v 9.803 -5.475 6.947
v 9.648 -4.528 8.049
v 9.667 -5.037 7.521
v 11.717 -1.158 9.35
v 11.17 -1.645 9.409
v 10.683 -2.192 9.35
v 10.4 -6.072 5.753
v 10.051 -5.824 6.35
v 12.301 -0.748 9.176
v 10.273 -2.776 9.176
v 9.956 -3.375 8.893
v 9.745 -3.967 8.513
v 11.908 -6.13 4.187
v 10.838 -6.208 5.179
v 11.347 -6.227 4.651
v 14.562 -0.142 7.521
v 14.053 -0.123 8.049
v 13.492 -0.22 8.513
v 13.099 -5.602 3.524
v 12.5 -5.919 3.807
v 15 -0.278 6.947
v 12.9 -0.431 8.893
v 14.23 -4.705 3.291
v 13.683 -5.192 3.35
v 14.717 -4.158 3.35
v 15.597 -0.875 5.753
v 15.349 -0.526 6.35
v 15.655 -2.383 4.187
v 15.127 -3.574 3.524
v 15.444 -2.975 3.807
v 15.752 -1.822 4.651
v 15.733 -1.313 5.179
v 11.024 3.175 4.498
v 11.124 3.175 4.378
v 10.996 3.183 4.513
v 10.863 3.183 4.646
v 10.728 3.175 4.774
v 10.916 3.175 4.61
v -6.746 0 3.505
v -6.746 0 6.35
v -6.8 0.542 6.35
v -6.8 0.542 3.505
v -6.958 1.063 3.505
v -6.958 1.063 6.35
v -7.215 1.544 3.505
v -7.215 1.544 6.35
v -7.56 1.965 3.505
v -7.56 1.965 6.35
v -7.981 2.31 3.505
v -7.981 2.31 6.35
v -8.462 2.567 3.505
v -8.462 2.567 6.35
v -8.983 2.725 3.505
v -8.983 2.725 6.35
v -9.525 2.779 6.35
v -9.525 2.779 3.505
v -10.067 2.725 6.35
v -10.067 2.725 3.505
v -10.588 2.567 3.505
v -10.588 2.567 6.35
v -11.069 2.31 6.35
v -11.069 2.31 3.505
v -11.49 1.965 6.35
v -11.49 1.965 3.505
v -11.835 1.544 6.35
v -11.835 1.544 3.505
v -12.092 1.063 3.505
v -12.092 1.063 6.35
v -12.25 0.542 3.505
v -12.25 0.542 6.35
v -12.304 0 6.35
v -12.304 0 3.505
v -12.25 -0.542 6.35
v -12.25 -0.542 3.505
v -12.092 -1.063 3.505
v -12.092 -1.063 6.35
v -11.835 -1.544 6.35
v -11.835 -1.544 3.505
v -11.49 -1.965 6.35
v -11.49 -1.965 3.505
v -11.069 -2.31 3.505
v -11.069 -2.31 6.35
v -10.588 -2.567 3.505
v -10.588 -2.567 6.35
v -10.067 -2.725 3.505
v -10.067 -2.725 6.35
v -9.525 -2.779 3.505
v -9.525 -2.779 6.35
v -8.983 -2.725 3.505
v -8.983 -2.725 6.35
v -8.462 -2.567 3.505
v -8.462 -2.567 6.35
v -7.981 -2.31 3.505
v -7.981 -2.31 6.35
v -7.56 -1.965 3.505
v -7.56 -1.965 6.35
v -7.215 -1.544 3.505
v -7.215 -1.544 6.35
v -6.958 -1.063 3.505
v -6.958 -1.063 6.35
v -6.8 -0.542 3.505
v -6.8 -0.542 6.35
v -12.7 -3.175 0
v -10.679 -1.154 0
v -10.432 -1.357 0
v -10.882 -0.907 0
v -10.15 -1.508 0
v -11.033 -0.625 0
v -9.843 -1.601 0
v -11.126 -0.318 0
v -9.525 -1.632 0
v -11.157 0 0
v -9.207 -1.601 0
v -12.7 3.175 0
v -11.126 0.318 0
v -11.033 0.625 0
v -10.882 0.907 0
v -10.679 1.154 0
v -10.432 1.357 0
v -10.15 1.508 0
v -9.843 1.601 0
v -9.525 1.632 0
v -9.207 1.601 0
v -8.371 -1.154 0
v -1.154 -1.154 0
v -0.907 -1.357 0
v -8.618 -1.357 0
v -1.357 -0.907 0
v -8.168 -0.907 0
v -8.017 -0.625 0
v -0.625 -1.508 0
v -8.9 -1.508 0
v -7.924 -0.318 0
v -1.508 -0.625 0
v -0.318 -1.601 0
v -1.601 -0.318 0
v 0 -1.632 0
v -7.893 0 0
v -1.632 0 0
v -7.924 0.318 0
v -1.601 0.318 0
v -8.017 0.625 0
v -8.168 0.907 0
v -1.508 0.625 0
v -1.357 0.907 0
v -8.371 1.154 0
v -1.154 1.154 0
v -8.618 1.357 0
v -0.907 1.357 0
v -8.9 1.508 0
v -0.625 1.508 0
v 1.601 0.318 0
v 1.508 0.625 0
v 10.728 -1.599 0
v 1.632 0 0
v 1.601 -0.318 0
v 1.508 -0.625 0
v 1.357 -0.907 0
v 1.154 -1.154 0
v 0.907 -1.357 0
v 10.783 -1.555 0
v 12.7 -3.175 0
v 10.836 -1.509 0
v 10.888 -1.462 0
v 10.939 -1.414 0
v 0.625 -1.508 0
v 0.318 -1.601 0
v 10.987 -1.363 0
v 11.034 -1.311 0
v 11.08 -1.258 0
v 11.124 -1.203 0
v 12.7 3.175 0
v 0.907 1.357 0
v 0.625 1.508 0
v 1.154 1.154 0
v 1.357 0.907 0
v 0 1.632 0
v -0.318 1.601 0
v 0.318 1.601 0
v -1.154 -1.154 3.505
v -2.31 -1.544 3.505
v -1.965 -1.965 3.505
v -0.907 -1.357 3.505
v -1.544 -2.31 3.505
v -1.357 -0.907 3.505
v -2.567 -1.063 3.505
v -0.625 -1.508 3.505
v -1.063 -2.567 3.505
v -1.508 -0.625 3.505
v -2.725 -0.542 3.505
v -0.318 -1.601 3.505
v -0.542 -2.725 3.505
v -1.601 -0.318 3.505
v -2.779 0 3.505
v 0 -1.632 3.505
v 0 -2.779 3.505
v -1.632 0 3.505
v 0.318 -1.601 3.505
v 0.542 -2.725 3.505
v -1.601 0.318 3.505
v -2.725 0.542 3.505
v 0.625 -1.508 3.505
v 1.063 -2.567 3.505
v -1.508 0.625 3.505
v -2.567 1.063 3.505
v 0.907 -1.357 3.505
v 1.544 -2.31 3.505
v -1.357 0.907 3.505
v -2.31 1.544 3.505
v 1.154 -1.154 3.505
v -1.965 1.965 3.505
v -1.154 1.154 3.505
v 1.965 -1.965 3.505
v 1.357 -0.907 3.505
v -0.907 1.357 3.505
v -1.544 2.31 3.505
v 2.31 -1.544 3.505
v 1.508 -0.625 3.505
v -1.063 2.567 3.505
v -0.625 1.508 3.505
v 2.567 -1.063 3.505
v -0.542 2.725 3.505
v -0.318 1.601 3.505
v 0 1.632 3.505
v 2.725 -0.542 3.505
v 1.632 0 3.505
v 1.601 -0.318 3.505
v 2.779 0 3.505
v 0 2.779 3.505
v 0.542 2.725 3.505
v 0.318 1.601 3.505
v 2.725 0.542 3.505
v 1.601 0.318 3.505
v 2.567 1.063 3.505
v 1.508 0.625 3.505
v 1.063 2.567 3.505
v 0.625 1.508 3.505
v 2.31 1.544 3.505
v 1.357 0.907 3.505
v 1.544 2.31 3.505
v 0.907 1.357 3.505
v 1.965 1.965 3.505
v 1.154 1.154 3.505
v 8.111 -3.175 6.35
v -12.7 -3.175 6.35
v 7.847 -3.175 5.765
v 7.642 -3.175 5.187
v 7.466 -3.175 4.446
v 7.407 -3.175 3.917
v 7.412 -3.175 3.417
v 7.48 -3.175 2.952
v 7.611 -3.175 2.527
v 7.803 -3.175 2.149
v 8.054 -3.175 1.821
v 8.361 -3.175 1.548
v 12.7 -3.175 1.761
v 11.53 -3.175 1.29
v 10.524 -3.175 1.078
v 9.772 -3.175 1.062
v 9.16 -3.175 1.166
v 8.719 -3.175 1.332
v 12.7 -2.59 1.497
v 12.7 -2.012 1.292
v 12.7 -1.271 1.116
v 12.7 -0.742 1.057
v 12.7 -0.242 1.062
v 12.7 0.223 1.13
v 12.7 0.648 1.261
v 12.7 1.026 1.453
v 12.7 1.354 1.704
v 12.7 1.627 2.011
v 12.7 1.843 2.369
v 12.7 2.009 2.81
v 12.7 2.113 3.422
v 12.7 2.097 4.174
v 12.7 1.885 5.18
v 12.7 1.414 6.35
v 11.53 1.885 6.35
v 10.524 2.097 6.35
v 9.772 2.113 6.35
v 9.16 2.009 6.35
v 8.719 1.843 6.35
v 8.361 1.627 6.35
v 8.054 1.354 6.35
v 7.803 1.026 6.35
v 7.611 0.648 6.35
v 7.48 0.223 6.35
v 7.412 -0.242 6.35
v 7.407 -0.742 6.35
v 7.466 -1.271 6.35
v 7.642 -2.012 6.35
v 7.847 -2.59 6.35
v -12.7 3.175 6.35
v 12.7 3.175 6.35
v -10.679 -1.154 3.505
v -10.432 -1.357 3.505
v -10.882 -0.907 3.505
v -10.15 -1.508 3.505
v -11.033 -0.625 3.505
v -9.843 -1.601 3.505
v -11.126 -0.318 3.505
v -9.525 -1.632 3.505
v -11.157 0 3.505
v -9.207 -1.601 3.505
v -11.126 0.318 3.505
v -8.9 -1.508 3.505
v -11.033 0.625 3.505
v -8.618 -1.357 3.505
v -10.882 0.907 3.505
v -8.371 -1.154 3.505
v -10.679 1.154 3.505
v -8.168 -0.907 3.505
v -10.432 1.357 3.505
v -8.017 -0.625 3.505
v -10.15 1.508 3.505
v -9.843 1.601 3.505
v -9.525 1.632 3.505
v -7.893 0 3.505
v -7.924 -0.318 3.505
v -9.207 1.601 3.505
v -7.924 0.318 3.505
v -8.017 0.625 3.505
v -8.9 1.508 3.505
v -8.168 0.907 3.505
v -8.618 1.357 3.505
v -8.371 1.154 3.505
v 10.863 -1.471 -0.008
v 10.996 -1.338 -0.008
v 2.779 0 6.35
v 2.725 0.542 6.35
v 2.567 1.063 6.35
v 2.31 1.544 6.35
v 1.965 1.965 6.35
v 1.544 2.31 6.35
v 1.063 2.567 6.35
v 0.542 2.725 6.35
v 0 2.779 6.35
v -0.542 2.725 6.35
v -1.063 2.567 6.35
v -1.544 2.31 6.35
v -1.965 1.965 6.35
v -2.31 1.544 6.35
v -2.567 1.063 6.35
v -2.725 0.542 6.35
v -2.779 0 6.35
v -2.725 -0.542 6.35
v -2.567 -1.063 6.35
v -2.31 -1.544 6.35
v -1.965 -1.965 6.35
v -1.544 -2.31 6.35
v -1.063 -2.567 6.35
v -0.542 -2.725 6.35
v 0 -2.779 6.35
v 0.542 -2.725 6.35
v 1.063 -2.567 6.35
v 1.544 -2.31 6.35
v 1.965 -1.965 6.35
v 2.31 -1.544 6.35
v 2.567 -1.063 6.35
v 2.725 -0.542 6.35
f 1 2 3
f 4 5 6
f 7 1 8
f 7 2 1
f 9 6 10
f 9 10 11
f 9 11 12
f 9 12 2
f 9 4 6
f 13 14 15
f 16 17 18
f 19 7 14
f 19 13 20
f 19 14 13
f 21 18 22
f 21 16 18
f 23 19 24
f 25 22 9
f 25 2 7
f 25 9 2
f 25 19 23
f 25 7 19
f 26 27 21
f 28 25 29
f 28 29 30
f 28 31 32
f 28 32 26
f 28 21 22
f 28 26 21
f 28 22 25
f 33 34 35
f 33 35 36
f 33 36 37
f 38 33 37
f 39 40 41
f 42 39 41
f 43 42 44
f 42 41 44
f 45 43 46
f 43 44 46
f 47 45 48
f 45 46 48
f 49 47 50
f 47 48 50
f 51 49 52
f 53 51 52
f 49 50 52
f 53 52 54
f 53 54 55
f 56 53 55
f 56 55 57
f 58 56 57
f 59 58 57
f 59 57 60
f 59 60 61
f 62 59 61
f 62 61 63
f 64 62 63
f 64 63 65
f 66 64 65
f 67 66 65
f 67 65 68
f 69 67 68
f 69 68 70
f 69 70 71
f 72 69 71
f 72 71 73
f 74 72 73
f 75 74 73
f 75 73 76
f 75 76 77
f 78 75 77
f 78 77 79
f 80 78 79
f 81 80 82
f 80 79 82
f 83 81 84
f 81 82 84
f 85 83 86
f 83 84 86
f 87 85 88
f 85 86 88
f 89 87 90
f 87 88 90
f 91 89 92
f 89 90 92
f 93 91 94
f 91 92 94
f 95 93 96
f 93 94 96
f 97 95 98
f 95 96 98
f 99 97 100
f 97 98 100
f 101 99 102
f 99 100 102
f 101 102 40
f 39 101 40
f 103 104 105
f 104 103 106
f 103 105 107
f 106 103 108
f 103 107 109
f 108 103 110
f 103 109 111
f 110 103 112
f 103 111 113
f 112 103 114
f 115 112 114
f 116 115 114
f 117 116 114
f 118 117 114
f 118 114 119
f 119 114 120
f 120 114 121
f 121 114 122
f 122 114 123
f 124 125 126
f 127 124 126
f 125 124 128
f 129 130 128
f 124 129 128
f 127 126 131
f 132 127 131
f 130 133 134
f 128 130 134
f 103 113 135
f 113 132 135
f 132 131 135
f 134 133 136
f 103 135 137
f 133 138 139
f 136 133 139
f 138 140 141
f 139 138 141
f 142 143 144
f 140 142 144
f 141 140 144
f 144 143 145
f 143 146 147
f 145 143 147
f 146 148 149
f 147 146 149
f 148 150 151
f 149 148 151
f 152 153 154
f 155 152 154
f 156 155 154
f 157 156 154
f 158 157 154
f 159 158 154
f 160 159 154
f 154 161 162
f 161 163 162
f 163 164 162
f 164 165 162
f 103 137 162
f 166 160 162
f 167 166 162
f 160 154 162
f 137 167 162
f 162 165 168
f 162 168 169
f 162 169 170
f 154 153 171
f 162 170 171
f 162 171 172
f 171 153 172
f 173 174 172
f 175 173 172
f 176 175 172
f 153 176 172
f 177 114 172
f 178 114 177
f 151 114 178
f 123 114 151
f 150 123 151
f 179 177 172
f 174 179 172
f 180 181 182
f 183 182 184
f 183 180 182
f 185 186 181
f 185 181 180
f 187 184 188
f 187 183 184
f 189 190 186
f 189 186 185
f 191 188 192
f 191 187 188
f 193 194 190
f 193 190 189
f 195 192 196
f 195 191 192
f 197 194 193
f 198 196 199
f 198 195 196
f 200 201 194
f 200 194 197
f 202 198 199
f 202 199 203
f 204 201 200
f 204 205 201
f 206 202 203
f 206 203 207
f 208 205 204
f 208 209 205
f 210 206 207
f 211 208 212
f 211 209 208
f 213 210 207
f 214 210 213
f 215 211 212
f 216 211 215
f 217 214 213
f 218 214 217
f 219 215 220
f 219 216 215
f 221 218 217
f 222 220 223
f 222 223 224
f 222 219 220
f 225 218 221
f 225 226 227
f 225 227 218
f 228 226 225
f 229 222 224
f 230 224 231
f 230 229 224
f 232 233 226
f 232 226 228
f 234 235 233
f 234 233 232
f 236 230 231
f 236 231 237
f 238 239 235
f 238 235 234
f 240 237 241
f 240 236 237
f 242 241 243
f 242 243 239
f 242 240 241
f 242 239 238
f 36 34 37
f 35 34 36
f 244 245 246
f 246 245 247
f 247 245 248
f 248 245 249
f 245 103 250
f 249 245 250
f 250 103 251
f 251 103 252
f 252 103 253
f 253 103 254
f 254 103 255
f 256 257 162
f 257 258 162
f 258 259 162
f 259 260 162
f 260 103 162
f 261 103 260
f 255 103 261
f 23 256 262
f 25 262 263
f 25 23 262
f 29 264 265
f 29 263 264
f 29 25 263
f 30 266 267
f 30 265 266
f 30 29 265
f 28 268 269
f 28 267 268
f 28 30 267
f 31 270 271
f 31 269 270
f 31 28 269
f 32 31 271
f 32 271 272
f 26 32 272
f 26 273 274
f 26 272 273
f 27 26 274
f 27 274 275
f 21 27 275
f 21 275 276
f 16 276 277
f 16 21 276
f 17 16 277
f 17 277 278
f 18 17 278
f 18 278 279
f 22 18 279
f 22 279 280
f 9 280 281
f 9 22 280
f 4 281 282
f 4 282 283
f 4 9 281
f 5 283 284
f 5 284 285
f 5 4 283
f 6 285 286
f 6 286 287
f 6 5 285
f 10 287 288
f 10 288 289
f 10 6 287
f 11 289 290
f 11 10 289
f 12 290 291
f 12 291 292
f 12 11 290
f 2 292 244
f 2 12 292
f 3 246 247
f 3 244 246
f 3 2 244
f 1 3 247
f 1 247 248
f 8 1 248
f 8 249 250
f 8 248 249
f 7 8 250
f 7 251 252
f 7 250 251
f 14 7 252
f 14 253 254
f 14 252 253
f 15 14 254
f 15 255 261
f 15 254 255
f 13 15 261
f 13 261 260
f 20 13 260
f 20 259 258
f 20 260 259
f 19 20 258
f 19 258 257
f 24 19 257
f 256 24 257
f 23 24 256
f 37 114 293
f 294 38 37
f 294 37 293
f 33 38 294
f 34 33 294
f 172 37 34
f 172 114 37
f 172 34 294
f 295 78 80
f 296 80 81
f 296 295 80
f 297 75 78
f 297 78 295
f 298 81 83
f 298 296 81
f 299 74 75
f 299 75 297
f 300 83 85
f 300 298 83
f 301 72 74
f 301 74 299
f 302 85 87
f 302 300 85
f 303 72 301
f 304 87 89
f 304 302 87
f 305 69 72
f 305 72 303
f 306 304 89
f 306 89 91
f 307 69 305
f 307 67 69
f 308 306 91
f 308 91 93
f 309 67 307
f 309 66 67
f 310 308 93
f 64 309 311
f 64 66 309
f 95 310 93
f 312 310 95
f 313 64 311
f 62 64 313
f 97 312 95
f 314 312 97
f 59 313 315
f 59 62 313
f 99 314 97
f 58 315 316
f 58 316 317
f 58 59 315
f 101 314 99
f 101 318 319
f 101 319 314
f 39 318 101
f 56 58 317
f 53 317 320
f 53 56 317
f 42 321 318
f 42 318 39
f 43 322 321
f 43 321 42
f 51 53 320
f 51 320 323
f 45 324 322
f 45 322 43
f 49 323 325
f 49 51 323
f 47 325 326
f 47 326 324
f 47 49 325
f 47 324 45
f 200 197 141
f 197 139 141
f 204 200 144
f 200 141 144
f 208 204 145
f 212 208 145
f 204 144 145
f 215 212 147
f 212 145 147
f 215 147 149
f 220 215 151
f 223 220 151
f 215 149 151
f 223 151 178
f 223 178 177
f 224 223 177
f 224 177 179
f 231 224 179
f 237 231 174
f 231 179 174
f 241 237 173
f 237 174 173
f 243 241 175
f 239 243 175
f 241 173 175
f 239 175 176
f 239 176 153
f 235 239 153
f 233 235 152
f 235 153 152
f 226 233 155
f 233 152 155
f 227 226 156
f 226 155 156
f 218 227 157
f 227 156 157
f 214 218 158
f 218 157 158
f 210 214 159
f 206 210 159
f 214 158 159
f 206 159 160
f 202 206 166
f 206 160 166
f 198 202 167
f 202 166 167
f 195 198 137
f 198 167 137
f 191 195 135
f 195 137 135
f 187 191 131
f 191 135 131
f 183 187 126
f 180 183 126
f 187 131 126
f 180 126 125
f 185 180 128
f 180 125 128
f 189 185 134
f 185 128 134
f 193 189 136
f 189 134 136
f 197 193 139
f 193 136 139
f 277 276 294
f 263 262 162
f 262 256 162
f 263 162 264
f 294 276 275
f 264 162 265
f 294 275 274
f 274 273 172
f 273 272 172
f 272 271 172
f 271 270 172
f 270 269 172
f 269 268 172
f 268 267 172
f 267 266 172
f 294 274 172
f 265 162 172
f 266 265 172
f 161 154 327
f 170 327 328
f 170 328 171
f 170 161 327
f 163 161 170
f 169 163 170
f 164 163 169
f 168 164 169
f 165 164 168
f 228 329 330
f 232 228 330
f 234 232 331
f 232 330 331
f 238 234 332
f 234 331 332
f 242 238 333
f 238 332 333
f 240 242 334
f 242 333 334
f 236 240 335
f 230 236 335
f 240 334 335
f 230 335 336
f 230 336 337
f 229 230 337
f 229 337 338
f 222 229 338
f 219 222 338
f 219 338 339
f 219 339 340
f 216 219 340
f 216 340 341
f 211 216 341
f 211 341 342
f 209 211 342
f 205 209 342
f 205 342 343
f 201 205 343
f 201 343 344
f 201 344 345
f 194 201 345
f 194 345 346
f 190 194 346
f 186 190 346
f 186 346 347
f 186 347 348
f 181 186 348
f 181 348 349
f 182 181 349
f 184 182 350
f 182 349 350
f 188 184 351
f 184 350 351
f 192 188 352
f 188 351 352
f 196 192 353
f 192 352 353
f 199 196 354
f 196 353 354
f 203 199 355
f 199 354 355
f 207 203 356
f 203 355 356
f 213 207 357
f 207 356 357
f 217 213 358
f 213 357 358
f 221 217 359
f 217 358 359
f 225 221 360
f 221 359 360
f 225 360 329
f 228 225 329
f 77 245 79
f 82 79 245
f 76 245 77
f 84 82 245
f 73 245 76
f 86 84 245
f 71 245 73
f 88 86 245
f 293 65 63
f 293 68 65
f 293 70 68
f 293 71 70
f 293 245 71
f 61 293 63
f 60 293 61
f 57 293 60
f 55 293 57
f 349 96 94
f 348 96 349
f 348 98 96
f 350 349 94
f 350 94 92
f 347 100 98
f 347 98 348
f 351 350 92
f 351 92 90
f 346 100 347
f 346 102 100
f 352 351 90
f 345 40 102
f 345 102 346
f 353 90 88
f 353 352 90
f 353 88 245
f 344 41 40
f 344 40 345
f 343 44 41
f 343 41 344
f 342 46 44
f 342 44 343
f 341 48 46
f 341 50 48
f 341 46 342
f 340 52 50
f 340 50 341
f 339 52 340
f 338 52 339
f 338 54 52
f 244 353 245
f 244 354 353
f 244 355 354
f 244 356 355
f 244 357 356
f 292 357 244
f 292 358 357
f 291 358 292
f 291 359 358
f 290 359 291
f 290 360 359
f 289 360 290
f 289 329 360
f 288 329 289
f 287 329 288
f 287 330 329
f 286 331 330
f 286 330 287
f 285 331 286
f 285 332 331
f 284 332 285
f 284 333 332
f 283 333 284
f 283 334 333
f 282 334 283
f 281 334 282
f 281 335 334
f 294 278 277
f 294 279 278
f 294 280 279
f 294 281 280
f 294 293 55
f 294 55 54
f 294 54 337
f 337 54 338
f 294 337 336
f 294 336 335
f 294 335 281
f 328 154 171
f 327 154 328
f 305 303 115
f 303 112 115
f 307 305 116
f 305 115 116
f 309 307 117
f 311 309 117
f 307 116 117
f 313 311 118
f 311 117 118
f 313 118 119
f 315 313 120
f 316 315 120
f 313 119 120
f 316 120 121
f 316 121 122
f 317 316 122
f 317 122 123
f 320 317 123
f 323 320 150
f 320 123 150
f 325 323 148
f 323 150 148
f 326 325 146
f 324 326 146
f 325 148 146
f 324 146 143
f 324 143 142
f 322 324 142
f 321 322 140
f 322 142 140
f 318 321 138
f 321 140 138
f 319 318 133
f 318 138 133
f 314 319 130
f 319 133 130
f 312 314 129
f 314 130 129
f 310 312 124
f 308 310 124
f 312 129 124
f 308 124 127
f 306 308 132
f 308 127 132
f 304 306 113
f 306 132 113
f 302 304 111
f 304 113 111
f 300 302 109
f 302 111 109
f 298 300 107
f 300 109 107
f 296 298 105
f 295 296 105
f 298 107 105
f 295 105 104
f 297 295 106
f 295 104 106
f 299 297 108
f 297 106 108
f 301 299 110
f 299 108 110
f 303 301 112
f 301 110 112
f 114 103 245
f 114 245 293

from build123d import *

# Parameters (mm, degrees)
SKETCH1_W                                      = 25.4
SKETCH1_H                                      = 6.35
BOSS_EXTRUDE1_DEPTH                            = 6.35
CBORE_FOR_4_SOCKET_HEAD_CAP_SCREW1_D           = 3.2639
CBORE_FOR_4_SOCKET_HEAD_CAP_SCREW1_DEPTH       = 7.5946
CBORE_FOR_4_SOCKET_HEAD_CAP_SCREW1_CBORE_D     = 5.55752
CBORE_FOR_4_SOCKET_HEAD_CAP_SCREW1_CBORE_DEPTH = 2.8448
CBORE_FOR_4_SOCKET_HEAD_CAP_SCREW1_TIP         = 0.980574487
SKETCH4_R                                      = 3.7465
BOSS_EXTRUDE2_DEPTH                            = 5.715


with BuildPart() as part:
    # Sketch1 → Boss-Extrude1 (new body)
    with BuildSketch(Plane.XY):
        Rectangle(SKETCH1_W, SKETCH1_H)
    extrude(amount=BOSS_EXTRUDE1_DEPTH)

    # CBORE for _4 Socket Head Cap Screw1
    with Locations(Plane.XY.offset(6.35)):
        with Locations((-9.525, 0), (0, 0)):
            CounterBoreHole(CBORE_FOR_4_SOCKET_HEAD_CAP_SCREW1_D / 2, CBORE_FOR_4_SOCKET_HEAD_CAP_SCREW1_CBORE_D / 2, CBORE_FOR_4_SOCKET_HEAD_CAP_SCREW1_CBORE_DEPTH, depth=CBORE_FOR_4_SOCKET_HEAD_CAP_SCREW1_DEPTH)
            with Locations((0, 0, -(CBORE_FOR_4_SOCKET_HEAD_CAP_SCREW1_DEPTH + CBORE_FOR_4_SOCKET_HEAD_CAP_SCREW1_TIP / 2))):  # 118° drill point
                Cone(0, CBORE_FOR_4_SOCKET_HEAD_CAP_SCREW1_D / 2, CBORE_FOR_4_SOCKET_HEAD_CAP_SCREW1_TIP, mode=Mode.SUBTRACT)

    # Sketch4 → Boss-Extrude2 (add)
    with BuildSketch(Plane(origin=(12.7, -3.175, 6.35), x_dir=(0.40824829, -0.40824829, -0.816496581), z_dir=(0.577350269, -0.577350269, 0.577350269))):
        Circle(SKETCH4_R)
    extrude(amount=-BOSS_EXTRUDE2_DEPTH)


solid = part.part
